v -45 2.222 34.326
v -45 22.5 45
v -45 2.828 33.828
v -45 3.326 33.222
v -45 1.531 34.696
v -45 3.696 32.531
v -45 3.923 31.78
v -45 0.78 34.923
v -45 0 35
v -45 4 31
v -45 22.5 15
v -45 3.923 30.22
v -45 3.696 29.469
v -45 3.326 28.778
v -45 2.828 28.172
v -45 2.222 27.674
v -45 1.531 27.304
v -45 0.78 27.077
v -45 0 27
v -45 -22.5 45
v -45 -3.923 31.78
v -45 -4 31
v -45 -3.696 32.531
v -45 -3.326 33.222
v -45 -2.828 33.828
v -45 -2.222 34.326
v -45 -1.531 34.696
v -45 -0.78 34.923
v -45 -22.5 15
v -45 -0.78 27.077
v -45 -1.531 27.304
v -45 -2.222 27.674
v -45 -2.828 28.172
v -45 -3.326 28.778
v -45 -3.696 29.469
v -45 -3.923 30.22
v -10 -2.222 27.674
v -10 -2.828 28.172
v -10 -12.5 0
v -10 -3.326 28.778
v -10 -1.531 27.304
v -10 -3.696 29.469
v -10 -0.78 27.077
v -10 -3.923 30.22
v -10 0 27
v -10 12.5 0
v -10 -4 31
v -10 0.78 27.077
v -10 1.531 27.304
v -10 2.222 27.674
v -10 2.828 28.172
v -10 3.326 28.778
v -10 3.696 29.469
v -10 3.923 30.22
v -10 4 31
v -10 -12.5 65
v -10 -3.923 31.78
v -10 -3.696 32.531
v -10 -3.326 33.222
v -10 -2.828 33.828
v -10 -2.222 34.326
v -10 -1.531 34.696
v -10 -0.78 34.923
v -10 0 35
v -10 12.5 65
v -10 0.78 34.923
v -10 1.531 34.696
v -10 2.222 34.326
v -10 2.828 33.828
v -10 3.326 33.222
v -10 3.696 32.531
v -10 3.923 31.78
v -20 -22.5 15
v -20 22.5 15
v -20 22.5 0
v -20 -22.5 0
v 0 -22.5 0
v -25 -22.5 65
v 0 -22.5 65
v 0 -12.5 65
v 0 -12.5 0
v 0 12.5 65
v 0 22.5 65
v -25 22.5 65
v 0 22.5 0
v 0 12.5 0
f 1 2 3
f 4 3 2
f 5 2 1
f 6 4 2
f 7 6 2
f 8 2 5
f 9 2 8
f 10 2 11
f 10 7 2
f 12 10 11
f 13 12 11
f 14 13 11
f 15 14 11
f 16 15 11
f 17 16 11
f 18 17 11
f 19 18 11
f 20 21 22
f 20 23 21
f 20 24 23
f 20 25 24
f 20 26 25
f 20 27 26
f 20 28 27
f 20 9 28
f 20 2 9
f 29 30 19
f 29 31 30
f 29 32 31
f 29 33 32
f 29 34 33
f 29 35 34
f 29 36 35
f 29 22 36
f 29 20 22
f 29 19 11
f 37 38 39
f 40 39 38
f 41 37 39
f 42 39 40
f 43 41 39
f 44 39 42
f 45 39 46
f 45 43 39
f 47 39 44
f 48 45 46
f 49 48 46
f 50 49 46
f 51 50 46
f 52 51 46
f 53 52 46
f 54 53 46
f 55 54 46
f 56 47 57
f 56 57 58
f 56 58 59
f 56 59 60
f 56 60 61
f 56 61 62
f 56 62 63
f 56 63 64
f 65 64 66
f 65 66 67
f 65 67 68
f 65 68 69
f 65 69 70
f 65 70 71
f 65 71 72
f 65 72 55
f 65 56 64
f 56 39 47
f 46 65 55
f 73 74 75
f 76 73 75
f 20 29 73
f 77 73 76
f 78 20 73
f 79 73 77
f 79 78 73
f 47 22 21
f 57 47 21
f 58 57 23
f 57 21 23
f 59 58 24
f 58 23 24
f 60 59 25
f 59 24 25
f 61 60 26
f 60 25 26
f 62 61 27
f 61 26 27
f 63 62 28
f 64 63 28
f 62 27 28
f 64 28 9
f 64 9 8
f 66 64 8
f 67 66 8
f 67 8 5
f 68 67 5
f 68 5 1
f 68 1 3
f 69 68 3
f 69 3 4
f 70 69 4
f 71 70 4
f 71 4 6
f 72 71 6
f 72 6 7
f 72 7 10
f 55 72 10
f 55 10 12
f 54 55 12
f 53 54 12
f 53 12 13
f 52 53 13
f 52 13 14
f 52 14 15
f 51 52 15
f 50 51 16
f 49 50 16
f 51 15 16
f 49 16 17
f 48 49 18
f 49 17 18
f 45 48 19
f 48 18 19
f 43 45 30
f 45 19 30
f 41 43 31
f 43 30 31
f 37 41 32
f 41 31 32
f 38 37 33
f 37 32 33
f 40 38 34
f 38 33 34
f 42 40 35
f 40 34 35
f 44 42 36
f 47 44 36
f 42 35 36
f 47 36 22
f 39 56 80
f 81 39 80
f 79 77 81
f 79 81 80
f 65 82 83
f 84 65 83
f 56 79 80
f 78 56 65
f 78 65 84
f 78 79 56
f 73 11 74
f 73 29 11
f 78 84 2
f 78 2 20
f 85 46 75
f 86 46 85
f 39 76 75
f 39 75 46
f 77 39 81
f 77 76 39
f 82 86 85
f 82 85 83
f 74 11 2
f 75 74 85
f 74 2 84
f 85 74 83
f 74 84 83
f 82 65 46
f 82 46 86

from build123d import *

# Parameters (mm, degrees)
F1_DEPTH = 22.5
F2_SIZE  = 20
F3_W     = 10
F3_H     = 25
F4_DEPTH = 65.001
F5_R     = 4
F6_DEPTH = 45.001


with BuildPart() as f1:
    # F0 (on Front) → F1 (new body, symmetric)
    with BuildSketch(Plane.XZ):
        Polygon((-20, 0), (0, 0), (0, 65), (-45, 65), (-45, 15), (-20, 15), align=None)
    extrude(amount=F1_DEPTH, both=True)

    # F2
    f2_edges = [f1.edges().sort_by_distance(p)[0] for p in [
        (-45, 0, 65),
    ]]
    chamfer(f2_edges, length=F2_SIZE)

    # F3 (on face) → F4 (cut, through all)
    with BuildSketch(Plane.XY.offset(65)):
        with Locations((-5, 0)):
            Rectangle(F3_W, F3_H)
    extrude(amount=-F4_DEPTH, mode=Mode.SUBTRACT)

    # F5 (on face) → F6 (cut, through all)
    with BuildSketch(Plane(origin=(-45, 0, 0), x_dir=(0, -1, 0), z_dir=(-1, 0, 0))):
        with Locations((0, 31)):
            Circle(F5_R)
    extrude(amount=-F6_DEPTH, mode=Mode.SUBTRACT)


solid = f1.part
